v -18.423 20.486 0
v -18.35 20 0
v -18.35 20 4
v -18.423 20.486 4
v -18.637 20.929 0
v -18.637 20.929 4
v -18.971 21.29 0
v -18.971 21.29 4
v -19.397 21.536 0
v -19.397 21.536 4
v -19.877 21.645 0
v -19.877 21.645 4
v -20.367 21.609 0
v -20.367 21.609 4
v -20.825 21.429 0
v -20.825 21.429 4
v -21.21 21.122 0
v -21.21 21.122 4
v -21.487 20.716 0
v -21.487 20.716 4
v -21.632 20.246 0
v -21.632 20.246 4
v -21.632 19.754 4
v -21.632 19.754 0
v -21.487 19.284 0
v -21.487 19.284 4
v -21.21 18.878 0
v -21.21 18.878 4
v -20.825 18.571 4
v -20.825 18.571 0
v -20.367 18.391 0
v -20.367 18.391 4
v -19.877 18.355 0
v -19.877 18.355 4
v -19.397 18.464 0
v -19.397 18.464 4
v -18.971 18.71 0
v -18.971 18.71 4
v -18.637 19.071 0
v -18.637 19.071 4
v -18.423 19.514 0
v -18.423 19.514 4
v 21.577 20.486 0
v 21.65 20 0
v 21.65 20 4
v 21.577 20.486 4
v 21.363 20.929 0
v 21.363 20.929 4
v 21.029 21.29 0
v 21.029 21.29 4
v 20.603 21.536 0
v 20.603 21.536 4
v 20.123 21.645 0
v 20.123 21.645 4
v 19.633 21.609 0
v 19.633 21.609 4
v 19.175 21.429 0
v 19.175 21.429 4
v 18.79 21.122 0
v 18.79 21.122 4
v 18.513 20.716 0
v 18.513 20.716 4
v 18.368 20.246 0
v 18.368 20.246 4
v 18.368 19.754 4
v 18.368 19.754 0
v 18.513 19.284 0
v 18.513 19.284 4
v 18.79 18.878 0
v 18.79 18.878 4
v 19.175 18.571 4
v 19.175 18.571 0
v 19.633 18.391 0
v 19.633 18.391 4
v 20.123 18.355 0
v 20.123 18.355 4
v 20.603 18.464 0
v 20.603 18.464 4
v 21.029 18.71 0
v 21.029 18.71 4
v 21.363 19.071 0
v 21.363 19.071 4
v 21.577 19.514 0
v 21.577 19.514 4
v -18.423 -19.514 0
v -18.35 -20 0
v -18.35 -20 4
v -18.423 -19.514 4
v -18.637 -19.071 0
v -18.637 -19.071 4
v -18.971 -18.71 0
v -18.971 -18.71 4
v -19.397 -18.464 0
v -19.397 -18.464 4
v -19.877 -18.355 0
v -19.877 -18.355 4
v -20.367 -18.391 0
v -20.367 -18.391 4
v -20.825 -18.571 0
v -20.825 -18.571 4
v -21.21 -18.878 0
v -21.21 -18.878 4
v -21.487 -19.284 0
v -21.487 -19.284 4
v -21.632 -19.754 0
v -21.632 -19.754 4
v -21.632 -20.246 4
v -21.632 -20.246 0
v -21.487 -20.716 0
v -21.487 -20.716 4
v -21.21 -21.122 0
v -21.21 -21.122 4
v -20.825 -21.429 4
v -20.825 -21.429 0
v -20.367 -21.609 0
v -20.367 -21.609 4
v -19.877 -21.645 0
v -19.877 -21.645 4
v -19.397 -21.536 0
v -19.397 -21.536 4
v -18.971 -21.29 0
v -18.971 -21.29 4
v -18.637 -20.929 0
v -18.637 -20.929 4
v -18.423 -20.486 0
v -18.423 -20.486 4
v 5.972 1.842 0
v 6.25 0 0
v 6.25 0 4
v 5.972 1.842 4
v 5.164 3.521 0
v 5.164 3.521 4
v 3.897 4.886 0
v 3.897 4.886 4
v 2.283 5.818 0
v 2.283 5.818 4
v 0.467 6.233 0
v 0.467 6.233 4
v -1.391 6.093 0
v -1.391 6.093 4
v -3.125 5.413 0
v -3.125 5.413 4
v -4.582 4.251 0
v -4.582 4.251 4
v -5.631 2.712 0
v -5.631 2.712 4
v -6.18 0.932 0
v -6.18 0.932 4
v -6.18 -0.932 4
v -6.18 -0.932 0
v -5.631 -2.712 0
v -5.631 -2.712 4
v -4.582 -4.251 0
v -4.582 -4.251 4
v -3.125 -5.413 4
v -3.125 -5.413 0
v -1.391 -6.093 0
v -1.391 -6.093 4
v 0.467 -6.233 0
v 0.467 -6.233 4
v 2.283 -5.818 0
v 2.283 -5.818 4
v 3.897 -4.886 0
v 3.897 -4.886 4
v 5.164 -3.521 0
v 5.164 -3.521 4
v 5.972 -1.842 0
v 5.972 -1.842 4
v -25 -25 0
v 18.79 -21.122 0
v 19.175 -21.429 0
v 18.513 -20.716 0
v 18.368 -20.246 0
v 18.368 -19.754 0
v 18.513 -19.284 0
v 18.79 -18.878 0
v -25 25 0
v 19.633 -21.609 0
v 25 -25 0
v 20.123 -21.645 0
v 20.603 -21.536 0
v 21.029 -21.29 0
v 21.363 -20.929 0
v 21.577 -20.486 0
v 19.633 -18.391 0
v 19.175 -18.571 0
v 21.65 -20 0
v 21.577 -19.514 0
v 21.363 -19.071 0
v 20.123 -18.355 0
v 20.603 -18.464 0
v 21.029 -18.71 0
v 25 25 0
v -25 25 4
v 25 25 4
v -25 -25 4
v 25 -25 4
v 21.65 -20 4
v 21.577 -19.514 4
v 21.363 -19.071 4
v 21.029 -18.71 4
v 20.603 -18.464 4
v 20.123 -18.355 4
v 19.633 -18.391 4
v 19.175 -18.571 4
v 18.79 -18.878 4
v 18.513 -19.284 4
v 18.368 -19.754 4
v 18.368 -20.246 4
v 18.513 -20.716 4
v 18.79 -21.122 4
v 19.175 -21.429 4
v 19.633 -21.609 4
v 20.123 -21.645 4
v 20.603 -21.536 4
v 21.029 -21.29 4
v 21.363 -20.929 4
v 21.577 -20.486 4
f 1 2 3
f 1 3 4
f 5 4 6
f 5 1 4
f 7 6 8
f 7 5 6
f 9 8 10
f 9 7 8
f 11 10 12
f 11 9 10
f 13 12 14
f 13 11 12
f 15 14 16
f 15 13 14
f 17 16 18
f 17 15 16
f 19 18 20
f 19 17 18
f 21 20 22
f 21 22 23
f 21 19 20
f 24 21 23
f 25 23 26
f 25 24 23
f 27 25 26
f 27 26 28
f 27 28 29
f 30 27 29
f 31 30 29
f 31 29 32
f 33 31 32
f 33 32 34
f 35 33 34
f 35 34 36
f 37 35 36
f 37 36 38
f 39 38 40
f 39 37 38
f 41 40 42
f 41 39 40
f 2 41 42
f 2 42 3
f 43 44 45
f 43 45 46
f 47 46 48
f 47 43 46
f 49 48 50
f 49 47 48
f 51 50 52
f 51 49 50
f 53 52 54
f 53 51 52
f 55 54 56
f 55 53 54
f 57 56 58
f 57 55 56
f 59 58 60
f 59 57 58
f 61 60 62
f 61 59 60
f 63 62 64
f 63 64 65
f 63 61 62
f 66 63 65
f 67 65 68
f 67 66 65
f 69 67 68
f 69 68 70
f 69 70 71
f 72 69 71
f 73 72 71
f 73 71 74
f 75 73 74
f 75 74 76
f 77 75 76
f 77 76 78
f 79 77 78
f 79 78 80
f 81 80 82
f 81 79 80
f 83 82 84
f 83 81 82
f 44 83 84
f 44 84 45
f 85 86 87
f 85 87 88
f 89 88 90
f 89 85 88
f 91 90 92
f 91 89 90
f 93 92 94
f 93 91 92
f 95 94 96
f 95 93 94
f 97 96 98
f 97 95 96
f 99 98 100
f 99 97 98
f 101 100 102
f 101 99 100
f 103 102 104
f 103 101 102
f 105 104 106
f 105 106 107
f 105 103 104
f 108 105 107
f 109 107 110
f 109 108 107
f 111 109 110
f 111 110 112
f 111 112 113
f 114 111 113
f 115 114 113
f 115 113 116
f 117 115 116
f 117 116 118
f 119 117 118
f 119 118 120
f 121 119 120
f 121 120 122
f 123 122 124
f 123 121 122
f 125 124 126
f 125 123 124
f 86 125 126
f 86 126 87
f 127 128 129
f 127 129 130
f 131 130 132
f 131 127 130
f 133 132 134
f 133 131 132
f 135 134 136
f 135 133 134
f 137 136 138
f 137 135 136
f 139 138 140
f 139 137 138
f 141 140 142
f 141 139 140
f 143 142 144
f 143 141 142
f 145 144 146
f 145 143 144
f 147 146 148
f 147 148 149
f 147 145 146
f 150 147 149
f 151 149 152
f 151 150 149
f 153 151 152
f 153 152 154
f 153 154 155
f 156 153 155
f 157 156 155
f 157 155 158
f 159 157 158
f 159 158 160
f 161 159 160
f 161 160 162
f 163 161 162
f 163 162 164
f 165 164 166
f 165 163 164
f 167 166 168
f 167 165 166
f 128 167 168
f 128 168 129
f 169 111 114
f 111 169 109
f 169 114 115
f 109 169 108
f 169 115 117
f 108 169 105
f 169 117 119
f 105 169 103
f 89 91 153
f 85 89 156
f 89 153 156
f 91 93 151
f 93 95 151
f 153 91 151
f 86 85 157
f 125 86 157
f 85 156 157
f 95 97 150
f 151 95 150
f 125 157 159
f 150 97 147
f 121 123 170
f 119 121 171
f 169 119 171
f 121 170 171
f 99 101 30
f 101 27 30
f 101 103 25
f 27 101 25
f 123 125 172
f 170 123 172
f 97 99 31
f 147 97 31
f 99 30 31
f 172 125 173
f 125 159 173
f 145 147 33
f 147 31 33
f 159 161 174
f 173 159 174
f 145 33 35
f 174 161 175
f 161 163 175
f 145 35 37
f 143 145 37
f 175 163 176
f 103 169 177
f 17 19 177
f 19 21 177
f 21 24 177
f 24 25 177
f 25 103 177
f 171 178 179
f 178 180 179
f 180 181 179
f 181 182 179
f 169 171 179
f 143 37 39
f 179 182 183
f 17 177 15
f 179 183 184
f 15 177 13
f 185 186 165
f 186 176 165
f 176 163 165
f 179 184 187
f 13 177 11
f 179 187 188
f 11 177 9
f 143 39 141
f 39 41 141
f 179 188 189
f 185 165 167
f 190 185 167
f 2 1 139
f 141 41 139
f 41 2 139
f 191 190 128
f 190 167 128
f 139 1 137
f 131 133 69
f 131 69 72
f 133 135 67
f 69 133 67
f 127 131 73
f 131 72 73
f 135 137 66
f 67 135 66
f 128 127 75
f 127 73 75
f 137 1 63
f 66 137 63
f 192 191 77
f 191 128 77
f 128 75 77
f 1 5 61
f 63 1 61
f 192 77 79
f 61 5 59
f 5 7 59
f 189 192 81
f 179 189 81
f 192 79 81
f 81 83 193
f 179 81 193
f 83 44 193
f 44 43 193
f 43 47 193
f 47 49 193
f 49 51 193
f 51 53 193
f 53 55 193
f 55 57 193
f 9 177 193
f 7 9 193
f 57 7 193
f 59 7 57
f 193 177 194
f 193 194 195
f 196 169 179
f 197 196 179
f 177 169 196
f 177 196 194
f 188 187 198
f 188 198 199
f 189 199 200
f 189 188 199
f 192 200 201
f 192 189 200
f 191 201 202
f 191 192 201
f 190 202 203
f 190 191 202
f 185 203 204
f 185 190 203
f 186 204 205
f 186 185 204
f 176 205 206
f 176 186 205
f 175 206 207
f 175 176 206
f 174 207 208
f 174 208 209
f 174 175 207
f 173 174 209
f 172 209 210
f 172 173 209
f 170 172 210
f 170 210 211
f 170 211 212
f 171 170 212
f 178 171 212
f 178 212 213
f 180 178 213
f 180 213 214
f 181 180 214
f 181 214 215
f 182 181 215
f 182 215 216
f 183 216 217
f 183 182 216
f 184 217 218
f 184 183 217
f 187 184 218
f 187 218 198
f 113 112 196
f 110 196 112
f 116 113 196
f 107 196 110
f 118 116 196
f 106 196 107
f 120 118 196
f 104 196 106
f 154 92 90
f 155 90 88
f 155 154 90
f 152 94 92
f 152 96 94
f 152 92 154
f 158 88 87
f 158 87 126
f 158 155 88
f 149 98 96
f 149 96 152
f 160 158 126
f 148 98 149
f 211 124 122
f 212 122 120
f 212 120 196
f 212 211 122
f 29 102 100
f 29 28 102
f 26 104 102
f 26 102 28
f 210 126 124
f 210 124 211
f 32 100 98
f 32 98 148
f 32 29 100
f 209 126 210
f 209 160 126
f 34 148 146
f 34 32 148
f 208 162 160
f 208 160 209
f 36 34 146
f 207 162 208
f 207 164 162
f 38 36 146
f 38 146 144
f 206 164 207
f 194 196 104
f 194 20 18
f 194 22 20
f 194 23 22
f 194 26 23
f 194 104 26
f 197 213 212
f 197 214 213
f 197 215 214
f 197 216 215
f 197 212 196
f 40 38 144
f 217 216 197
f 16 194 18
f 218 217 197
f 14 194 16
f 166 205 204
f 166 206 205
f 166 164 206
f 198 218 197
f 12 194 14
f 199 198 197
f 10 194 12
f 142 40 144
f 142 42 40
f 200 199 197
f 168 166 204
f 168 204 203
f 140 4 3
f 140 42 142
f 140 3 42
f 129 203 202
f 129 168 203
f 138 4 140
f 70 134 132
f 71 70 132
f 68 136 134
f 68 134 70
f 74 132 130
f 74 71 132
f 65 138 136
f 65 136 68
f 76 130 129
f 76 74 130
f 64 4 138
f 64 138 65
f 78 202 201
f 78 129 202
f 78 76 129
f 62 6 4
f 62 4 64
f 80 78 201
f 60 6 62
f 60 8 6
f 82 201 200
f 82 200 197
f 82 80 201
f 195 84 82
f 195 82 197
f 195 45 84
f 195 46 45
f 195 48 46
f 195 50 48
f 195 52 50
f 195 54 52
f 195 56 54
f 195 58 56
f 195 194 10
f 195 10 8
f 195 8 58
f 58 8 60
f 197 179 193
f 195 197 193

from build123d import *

# Parameters (mm, degrees)
SKETCH_1_W      = 50
SKETCH_1_H      = 50
SKETCH_1_R      = 1.65
SKETCH_1_R_2    = 6.25
EXTRUDE_1_DEPTH = 4


with BuildPart() as part:
    # 草图1 → 凸台-拉伸1 (new body)
    with BuildSketch(Plane.XY):
        Rectangle(SKETCH_1_W, SKETCH_1_H)
        with Locations((-20, -20)):
            Circle(SKETCH_1_R, mode=Mode.SUBTRACT)
        with Locations((-20, 20)):
            Circle(SKETCH_1_R, mode=Mode.SUBTRACT)
        with Locations((20, 20)):
            Circle(SKETCH_1_R, mode=Mode.SUBTRACT)
        with Locations((20, -20)):
            Circle(SKETCH_1_R, mode=Mode.SUBTRACT)
        Circle(SKETCH_1_R_2, mode=Mode.SUBTRACT)
    extrude(amount=EXTRUDE_1_DEPTH)


solid = part.part
